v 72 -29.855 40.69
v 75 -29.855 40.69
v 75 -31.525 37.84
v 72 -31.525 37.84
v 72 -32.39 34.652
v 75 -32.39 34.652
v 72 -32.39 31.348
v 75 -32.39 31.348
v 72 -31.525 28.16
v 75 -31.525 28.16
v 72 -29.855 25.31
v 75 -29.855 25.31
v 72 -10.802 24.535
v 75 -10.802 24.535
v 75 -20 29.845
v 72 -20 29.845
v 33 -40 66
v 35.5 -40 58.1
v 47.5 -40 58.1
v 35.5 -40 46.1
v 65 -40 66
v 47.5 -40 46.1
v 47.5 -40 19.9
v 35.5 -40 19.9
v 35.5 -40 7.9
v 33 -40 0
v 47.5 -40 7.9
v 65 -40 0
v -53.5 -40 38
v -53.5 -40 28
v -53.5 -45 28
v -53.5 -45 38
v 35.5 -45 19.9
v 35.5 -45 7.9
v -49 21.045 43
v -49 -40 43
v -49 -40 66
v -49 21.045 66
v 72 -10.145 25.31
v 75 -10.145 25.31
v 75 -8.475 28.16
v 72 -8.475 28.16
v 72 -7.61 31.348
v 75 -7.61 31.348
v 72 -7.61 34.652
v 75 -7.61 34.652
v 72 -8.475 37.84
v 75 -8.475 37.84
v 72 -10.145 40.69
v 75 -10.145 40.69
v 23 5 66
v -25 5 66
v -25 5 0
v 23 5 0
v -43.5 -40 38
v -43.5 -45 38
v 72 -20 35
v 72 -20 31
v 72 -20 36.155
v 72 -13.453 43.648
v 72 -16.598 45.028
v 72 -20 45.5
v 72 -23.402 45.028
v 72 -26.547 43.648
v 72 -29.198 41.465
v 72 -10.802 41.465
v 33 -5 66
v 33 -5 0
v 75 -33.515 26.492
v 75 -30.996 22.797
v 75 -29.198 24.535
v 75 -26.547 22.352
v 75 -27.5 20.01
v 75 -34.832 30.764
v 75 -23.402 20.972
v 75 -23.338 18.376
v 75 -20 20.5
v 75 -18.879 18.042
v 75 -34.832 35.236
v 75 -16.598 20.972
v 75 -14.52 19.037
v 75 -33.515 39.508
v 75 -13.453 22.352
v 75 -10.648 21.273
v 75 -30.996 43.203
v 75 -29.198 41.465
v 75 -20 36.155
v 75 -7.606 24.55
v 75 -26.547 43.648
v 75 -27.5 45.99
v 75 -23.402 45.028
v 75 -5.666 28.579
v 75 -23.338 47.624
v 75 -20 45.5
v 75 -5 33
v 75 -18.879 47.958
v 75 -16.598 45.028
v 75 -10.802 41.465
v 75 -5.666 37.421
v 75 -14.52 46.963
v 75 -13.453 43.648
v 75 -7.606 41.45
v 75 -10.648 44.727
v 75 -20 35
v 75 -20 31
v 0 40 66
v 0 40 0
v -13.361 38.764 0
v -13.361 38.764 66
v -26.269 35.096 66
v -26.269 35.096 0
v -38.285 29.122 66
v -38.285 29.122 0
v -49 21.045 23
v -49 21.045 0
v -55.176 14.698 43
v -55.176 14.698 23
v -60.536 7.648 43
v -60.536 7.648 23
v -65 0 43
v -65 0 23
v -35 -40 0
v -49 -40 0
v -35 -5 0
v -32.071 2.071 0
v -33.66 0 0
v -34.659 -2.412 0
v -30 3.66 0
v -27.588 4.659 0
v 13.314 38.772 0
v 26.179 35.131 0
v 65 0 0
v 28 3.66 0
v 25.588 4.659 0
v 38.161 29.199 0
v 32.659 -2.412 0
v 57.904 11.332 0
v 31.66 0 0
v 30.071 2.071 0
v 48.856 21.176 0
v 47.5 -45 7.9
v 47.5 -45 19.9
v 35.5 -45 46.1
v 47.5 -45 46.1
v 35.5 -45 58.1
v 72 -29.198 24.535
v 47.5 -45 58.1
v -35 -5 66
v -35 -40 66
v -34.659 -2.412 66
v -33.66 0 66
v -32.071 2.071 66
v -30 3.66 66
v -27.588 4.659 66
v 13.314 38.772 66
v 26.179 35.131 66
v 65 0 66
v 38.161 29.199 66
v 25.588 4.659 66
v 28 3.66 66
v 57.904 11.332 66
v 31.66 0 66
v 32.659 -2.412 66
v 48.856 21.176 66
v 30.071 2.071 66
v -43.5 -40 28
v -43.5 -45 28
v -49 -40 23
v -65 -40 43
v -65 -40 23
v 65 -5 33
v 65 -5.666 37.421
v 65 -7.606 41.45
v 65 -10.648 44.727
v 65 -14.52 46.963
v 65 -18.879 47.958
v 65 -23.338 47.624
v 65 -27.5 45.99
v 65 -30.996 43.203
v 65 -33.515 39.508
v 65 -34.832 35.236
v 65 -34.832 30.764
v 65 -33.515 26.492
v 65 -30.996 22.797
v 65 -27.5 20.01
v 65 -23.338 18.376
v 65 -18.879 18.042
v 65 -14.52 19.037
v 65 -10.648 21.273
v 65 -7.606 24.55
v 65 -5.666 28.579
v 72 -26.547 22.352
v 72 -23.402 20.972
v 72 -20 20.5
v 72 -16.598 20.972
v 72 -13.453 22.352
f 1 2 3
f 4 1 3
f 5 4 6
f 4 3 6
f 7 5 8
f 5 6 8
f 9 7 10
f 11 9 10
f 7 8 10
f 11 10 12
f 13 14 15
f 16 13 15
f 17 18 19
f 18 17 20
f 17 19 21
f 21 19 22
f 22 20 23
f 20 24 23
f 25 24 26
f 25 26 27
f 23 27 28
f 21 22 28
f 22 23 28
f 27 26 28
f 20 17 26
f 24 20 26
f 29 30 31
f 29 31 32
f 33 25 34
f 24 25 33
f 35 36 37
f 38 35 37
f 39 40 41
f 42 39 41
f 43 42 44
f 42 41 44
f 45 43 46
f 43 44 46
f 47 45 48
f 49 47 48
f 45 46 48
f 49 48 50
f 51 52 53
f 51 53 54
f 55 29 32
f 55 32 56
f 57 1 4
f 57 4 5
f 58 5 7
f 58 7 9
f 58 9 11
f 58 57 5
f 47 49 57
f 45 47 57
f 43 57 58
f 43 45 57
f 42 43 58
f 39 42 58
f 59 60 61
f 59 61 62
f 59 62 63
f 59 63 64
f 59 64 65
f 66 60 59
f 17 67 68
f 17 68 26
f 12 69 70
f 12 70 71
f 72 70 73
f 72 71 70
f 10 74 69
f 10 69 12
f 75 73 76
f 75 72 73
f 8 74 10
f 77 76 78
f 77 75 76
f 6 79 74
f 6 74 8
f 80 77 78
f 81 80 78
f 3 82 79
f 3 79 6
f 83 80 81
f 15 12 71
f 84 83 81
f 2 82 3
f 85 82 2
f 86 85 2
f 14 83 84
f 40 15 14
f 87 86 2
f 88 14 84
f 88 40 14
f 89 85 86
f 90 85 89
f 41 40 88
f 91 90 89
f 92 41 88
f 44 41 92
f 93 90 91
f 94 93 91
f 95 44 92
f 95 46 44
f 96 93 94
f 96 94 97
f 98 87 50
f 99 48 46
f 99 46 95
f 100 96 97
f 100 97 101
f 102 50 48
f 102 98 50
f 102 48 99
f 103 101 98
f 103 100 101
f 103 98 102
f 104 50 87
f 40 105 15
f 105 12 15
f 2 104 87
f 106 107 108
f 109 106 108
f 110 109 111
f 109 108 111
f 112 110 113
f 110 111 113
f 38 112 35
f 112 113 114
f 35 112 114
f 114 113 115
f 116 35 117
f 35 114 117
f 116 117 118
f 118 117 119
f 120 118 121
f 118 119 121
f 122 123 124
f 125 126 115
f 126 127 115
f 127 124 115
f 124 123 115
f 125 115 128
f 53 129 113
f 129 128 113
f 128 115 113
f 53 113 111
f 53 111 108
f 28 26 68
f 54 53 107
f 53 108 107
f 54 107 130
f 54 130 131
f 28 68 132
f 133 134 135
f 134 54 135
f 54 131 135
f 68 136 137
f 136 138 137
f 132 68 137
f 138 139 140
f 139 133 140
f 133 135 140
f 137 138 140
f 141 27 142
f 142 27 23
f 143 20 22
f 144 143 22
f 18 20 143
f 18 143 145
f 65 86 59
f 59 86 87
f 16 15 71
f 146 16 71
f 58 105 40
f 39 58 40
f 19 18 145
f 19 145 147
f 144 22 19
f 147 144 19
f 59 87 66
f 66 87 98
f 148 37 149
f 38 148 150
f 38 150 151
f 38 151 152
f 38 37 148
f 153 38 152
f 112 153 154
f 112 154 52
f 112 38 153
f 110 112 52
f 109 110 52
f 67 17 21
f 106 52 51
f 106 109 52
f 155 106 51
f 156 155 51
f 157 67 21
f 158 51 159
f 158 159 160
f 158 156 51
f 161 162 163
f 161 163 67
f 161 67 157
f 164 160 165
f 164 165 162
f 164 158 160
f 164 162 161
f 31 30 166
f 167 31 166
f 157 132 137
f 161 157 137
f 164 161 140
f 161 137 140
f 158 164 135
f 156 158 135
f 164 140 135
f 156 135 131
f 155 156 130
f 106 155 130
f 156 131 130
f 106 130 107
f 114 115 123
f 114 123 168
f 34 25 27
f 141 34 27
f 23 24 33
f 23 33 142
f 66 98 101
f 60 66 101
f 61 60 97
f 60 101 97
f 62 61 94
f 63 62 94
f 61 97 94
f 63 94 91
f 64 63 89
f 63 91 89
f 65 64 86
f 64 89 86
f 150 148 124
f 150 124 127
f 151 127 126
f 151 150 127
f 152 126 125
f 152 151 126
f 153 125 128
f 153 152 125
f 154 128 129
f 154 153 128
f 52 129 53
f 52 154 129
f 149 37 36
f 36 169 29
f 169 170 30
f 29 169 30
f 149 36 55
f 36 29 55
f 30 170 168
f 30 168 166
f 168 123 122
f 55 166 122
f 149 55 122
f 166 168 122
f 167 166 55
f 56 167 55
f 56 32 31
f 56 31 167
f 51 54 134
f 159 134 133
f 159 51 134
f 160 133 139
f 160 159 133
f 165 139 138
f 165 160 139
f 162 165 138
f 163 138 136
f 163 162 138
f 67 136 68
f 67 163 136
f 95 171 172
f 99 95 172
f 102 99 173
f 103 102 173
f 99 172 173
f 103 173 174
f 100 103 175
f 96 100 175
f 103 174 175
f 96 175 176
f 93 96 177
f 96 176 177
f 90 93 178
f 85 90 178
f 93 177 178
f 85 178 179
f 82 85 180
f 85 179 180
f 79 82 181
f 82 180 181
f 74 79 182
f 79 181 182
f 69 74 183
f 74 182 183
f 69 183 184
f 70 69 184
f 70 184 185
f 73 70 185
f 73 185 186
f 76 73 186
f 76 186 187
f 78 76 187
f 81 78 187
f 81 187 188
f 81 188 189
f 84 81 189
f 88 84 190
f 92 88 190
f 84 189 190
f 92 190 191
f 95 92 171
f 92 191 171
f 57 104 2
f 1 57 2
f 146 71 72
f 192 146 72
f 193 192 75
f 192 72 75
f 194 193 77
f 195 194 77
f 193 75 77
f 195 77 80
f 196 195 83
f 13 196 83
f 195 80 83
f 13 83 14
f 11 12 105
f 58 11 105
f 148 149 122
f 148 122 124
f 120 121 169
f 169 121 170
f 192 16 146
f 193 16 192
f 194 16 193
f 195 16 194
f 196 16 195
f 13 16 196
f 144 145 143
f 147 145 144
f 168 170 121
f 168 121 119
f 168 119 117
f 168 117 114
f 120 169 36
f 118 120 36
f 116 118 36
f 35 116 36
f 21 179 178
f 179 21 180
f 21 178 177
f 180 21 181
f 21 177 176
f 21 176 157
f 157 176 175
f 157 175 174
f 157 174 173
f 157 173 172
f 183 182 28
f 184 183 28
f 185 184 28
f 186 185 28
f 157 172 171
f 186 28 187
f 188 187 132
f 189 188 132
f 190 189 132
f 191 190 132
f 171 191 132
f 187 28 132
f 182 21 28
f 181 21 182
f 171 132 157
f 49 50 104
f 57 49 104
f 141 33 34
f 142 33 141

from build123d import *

# Parameters (mm, degrees)
BOSS_EXTRUDE1_DEPTH = 66
SKETCH4_R           = 15
BOSS_EXTRUDE2_DEPTH = 10
CUT_EXTRUDE2_DEPTH  = 108.615054709
SKETCH5_W           = 16
SKETCH5_H           = 23
CUT_EXTRUDE3_DEPTH  = 128.988280714
SKETCH6_W           = 10
SKETCH6_H           = 10
BOSS_EXTRUDE3_DEPTH = 5
SKETCH7_W           = 12
SKETCH7_H           = 12
BOSS_EXTRUDE4_DEPTH = 5
CUT_EXTRUDE4_DEPTH  = 3


with BuildPart() as part:
    # Sketch2 → Boss-Extrude1 (new body)
    with BuildSketch(Plane.XY):
        with BuildLine():
            ThreePointArc((65, 0), (38.160843726, 29.198871234), (-1.89e-07, 40))
            ThreePointArc((-1.89e-07, 40), (-38.160843886, 29.198871136), (-65, 0))
            Line((-65, 0), (-65, -40))
            Line((-65, -40), (65, -40))
            Line((65, -40), (65, 0))
        make_face()
    extrude(amount=BOSS_EXTRUDE1_DEPTH)

    # Sketch4 → Boss-Extrude2 (add)
    with BuildSketch(Plane(origin=(65, 0, 0), x_dir=(0, 0, -1), z_dir=(1, 0, 0))):
        with Locations(Location((-33, -20, 0), (0, 0, 90))):
            Circle(SKETCH4_R)
    extrude(amount=BOSS_EXTRUDE2_DEPTH)

    # Sketch3 → Cut-Extrude2 (cut, through all)
    with BuildSketch(Plane.XY.offset(66)):
        with BuildLine():
            Line((-25, 5), (23, 5))
            ThreePointArc((23, 5), (30.071067812, 2.071067812), (33, -5))
            Line((33, -5), (33, -40))
            Line((33, -40), (-35, -40))
            Line((-35, -40), (-35, -5))
            ThreePointArc((-35, -5), (-32.071067812, 2.071067812), (-25, 5))
        make_face()
    extrude(amount=-CUT_EXTRUDE2_DEPTH, mode=Mode.SUBTRACT)

    # Sketch5 → Cut-Extrude3 (cut, through all)
    with BuildSketch(Plane.XZ.offset(40)):
        with Locations((-57, 54.5)):
            Rectangle(SKETCH5_W, SKETCH5_H)
        with Locations((-57, 11.5)):
            Rectangle(SKETCH5_W, SKETCH5_H)
    extrude(amount=-CUT_EXTRUDE3_DEPTH, mode=Mode.SUBTRACT)

    # Sketch6 → Boss-Extrude3 (add)
    with BuildSketch(Plane.XZ.offset(40)):
        with Locations((-48.5, 33)):
            Rectangle(SKETCH6_W, SKETCH6_H)
    extrude(amount=BOSS_EXTRUDE3_DEPTH)

    # Sketch7 → Boss-Extrude4 (add)
    with BuildSketch(Plane.XZ.offset(40)):
        with Locations((41.5, 13.9)):
            Rectangle(SKETCH7_W, SKETCH7_H)
        with Locations((41.5, 52.1)):
            Rectangle(SKETCH7_W, SKETCH7_H)
    extrude(amount=BOSS_EXTRUDE4_DEPTH)

    # Sketch8 → Cut-Extrude4 (cut)
    with BuildSketch(Plane(origin=(75, 0, 0), x_dir=(0, 0, -1), z_dir=(1, 0, 0))):
        with BuildLine():
            Line((-40.689709202, -10.145134583), (-35, -20))
            Line((-35, -20), (-40.689709202, -29.854865417))
            ThreePointArc((-40.689709202, -29.854865417), (-33, -32.5), (-25.310290798, -29.854865417))
            Line((-25.310290798, -29.854865417), (-31, -20))
            Line((-31, -20), (-25.310290798, -10.145134583))
            ThreePointArc((-25.310290798, -10.145134583), (-33, -7.5), (-40.689709202, -10.145134583))
        make_face()
        with BuildLine():
            Line((-36.154700538, -20), (-41.464916663, -10.802435872))
            ThreePointArc((-41.464916663, -10.802435872), (-45.5, -20), (-41.464916663, -29.197564128))
            Line((-41.464916663, -29.197564128), (-36.154700538, -20))
        make_face()
        with BuildLine():
            ThreePointArc((-24.535083337, -29.197564128), (-20.5, -20), (-24.535083337, -10.802435872))
            Line((-24.535083337, -10.802435872), (-29.845299462, -20))
            Line((-29.845299462, -20), (-24.535083337, -29.197564128))
        make_face()
    extrude(amount=-CUT_EXTRUDE4_DEPTH, mode=Mode.SUBTRACT)


solid = part.part
